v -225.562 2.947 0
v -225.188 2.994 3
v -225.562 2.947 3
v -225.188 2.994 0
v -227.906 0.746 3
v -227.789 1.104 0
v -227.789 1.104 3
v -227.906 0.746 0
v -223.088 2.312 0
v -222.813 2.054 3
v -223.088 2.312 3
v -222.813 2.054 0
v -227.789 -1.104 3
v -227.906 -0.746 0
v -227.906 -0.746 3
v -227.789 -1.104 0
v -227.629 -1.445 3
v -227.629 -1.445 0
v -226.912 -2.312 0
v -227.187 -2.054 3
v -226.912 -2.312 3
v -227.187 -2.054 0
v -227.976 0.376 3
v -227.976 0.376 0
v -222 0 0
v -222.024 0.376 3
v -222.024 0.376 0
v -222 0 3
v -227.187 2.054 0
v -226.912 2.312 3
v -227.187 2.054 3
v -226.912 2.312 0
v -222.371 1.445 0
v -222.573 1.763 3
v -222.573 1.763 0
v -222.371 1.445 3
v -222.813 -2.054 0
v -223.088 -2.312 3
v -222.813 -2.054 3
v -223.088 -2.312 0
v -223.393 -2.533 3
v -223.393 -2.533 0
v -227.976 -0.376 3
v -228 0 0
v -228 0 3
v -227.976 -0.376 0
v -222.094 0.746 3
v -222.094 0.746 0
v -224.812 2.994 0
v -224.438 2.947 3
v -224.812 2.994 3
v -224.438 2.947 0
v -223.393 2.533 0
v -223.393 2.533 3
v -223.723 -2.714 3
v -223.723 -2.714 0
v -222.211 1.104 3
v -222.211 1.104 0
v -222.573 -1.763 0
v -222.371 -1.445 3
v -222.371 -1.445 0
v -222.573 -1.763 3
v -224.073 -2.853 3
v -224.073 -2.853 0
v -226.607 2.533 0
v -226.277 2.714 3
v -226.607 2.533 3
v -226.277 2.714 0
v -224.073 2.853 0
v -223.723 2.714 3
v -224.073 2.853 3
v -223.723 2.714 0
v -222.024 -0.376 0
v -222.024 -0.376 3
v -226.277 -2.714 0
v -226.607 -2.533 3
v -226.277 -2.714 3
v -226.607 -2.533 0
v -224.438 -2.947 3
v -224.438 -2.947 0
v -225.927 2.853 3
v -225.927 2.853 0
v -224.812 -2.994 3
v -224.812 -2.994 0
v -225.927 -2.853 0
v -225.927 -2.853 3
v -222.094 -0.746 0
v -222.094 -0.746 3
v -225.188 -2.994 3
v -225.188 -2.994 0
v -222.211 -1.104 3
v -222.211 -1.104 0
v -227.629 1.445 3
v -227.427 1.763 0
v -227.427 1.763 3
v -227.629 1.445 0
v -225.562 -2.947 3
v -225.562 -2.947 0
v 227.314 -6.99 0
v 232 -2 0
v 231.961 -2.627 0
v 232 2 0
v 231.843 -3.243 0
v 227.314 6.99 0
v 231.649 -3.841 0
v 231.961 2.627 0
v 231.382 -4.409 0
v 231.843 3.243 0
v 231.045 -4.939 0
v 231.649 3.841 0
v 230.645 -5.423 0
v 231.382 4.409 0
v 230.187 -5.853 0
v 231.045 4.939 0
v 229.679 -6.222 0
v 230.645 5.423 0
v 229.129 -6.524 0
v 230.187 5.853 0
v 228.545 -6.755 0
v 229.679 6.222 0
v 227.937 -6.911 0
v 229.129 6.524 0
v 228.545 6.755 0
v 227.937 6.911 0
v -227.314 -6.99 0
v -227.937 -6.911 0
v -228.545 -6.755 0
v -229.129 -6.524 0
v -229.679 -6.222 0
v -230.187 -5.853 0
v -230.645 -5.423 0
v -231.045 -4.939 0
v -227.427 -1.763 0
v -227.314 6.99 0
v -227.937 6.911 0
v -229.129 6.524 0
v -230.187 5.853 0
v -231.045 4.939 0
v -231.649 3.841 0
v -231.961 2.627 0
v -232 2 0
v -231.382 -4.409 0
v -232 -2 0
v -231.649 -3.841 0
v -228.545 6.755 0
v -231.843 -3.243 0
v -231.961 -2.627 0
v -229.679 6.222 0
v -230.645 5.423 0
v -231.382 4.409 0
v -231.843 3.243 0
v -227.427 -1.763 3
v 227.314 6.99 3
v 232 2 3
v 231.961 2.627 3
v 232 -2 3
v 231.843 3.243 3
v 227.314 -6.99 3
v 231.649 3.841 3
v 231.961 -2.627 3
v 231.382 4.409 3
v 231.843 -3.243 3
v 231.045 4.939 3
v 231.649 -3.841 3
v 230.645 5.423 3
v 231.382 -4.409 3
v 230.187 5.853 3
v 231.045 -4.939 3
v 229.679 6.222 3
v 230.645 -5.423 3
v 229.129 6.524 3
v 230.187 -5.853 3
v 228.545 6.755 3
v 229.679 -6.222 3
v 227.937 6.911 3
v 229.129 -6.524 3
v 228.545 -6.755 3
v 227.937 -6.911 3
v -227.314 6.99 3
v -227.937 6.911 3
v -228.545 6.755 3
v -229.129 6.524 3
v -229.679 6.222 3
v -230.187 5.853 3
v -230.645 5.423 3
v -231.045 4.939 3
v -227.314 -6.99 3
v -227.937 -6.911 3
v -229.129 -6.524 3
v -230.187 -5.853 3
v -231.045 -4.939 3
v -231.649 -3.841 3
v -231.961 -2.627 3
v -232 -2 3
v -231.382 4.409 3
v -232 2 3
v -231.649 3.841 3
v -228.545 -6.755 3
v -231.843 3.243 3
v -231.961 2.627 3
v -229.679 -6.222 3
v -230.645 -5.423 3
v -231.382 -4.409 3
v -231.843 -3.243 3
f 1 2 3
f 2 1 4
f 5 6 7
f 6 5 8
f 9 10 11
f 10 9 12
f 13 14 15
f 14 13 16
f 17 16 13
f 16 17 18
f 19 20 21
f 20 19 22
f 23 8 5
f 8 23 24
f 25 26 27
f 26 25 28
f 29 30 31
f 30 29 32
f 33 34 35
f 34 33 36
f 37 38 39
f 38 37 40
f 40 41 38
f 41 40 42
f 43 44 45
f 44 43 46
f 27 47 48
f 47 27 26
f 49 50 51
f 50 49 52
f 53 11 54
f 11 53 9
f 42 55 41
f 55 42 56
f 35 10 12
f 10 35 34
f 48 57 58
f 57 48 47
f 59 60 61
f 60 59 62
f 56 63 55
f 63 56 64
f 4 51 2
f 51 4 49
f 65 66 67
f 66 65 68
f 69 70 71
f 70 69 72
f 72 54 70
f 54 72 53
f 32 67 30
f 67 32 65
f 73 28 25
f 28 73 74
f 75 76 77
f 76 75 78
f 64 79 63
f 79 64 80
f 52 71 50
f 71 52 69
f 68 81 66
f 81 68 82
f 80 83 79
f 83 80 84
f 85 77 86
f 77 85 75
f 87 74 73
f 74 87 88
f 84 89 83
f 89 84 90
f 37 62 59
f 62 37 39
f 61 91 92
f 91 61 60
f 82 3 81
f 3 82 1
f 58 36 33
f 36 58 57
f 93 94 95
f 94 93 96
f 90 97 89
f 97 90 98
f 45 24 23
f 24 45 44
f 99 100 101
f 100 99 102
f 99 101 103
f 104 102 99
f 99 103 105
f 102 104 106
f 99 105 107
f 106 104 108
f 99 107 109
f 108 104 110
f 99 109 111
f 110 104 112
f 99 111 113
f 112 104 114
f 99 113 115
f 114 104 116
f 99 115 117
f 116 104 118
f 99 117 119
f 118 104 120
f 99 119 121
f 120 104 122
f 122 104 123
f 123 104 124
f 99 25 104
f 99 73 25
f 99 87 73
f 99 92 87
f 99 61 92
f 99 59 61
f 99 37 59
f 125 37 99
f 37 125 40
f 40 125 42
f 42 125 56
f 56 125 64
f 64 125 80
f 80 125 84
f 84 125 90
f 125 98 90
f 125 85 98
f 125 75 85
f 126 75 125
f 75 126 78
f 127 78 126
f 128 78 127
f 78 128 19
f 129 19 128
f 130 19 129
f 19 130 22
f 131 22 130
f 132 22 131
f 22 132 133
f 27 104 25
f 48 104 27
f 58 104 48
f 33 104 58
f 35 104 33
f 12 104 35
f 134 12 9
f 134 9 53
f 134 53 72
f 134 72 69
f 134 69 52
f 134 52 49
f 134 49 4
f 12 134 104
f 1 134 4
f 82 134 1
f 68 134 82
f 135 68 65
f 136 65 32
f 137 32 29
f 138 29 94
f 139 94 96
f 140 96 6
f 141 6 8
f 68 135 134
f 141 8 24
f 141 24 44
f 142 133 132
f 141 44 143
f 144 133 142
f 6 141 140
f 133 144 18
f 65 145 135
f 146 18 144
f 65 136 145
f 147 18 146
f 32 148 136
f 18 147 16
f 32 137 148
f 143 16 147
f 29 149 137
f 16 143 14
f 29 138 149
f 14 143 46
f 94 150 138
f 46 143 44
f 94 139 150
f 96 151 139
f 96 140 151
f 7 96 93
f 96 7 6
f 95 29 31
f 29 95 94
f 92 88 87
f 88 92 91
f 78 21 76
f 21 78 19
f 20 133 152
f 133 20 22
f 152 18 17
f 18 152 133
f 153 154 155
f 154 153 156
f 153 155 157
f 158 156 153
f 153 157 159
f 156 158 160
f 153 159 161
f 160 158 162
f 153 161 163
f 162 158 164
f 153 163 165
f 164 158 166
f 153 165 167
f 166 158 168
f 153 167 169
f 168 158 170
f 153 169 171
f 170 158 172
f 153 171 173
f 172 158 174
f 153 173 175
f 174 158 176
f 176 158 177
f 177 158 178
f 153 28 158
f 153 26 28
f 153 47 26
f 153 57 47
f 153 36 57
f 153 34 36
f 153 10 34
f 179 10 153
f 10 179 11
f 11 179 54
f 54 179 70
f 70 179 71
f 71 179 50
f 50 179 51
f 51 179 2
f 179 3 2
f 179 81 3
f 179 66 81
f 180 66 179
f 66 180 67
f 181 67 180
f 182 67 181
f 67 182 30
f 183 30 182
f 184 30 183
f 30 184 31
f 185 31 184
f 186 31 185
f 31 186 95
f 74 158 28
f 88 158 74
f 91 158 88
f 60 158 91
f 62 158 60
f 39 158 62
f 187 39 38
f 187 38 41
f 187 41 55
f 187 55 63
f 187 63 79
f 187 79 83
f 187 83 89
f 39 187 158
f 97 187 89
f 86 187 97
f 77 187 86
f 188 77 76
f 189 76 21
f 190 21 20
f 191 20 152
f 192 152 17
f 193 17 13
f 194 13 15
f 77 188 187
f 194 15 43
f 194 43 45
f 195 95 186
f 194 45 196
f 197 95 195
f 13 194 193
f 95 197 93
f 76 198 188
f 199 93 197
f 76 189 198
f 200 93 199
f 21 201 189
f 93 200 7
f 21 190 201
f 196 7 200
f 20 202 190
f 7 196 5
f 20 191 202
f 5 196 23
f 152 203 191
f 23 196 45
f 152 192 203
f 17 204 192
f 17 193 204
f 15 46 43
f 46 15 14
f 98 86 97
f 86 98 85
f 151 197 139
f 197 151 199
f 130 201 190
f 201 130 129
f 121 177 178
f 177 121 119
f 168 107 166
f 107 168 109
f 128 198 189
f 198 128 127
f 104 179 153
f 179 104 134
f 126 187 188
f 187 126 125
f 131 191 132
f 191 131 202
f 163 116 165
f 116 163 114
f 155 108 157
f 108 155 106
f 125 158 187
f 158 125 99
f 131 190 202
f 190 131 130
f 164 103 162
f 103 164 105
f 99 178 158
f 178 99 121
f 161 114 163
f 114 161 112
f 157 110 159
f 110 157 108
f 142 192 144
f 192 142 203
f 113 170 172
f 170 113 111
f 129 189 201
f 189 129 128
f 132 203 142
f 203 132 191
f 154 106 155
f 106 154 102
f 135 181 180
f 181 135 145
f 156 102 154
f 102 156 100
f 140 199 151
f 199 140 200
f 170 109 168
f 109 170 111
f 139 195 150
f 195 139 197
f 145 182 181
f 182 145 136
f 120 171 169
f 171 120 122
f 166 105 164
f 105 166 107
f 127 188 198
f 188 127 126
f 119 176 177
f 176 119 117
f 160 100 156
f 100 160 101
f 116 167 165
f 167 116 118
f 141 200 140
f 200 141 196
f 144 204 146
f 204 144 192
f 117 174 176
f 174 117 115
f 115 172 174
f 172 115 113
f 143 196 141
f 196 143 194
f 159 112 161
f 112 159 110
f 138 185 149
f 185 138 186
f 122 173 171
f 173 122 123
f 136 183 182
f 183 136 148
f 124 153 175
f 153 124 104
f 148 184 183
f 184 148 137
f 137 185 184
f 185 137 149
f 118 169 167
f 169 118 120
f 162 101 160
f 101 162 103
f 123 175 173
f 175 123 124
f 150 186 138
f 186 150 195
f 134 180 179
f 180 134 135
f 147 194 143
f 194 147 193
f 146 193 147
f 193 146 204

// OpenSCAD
$fn = 50;


difference() {
	union() {
		hull() {
			translate(v = [-227.0000000000, 2.0000000000, 0]) {
				cylinder(h = 3, r = 5);
			}
			translate(v = [227.0000000000, 2.0000000000, 0]) {
				cylinder(h = 3, r = 5);
			}
			translate(v = [-227.0000000000, -2.0000000000, 0]) {
				cylinder(h = 3, r = 5);
			}
			translate(v = [227.0000000000, -2.0000000000, 0]) {
				cylinder(h = 3, r = 5);
			}
		}
	}
	union() {
		translate(v = [-225.0000000000, 0.0000000000, 0]) {
			cylinder(h = 3, r = 3.0000000000);
		}
		translate(v = [-225.0000000000, 0.0000000000, 0]) {
			cylinder(h = 3, r = 1.5000000000);
		}
		translate(v = [-225.0000000000, 0.0000000000, 0]) {
			cylinder(h = 3, r = 1.5000000000);
		}
		translate(v = [-225.0000000000, 0.0000000000, 0]) {
			cylinder(h = 3, r = 1.5000000000);
		}
	}
}
